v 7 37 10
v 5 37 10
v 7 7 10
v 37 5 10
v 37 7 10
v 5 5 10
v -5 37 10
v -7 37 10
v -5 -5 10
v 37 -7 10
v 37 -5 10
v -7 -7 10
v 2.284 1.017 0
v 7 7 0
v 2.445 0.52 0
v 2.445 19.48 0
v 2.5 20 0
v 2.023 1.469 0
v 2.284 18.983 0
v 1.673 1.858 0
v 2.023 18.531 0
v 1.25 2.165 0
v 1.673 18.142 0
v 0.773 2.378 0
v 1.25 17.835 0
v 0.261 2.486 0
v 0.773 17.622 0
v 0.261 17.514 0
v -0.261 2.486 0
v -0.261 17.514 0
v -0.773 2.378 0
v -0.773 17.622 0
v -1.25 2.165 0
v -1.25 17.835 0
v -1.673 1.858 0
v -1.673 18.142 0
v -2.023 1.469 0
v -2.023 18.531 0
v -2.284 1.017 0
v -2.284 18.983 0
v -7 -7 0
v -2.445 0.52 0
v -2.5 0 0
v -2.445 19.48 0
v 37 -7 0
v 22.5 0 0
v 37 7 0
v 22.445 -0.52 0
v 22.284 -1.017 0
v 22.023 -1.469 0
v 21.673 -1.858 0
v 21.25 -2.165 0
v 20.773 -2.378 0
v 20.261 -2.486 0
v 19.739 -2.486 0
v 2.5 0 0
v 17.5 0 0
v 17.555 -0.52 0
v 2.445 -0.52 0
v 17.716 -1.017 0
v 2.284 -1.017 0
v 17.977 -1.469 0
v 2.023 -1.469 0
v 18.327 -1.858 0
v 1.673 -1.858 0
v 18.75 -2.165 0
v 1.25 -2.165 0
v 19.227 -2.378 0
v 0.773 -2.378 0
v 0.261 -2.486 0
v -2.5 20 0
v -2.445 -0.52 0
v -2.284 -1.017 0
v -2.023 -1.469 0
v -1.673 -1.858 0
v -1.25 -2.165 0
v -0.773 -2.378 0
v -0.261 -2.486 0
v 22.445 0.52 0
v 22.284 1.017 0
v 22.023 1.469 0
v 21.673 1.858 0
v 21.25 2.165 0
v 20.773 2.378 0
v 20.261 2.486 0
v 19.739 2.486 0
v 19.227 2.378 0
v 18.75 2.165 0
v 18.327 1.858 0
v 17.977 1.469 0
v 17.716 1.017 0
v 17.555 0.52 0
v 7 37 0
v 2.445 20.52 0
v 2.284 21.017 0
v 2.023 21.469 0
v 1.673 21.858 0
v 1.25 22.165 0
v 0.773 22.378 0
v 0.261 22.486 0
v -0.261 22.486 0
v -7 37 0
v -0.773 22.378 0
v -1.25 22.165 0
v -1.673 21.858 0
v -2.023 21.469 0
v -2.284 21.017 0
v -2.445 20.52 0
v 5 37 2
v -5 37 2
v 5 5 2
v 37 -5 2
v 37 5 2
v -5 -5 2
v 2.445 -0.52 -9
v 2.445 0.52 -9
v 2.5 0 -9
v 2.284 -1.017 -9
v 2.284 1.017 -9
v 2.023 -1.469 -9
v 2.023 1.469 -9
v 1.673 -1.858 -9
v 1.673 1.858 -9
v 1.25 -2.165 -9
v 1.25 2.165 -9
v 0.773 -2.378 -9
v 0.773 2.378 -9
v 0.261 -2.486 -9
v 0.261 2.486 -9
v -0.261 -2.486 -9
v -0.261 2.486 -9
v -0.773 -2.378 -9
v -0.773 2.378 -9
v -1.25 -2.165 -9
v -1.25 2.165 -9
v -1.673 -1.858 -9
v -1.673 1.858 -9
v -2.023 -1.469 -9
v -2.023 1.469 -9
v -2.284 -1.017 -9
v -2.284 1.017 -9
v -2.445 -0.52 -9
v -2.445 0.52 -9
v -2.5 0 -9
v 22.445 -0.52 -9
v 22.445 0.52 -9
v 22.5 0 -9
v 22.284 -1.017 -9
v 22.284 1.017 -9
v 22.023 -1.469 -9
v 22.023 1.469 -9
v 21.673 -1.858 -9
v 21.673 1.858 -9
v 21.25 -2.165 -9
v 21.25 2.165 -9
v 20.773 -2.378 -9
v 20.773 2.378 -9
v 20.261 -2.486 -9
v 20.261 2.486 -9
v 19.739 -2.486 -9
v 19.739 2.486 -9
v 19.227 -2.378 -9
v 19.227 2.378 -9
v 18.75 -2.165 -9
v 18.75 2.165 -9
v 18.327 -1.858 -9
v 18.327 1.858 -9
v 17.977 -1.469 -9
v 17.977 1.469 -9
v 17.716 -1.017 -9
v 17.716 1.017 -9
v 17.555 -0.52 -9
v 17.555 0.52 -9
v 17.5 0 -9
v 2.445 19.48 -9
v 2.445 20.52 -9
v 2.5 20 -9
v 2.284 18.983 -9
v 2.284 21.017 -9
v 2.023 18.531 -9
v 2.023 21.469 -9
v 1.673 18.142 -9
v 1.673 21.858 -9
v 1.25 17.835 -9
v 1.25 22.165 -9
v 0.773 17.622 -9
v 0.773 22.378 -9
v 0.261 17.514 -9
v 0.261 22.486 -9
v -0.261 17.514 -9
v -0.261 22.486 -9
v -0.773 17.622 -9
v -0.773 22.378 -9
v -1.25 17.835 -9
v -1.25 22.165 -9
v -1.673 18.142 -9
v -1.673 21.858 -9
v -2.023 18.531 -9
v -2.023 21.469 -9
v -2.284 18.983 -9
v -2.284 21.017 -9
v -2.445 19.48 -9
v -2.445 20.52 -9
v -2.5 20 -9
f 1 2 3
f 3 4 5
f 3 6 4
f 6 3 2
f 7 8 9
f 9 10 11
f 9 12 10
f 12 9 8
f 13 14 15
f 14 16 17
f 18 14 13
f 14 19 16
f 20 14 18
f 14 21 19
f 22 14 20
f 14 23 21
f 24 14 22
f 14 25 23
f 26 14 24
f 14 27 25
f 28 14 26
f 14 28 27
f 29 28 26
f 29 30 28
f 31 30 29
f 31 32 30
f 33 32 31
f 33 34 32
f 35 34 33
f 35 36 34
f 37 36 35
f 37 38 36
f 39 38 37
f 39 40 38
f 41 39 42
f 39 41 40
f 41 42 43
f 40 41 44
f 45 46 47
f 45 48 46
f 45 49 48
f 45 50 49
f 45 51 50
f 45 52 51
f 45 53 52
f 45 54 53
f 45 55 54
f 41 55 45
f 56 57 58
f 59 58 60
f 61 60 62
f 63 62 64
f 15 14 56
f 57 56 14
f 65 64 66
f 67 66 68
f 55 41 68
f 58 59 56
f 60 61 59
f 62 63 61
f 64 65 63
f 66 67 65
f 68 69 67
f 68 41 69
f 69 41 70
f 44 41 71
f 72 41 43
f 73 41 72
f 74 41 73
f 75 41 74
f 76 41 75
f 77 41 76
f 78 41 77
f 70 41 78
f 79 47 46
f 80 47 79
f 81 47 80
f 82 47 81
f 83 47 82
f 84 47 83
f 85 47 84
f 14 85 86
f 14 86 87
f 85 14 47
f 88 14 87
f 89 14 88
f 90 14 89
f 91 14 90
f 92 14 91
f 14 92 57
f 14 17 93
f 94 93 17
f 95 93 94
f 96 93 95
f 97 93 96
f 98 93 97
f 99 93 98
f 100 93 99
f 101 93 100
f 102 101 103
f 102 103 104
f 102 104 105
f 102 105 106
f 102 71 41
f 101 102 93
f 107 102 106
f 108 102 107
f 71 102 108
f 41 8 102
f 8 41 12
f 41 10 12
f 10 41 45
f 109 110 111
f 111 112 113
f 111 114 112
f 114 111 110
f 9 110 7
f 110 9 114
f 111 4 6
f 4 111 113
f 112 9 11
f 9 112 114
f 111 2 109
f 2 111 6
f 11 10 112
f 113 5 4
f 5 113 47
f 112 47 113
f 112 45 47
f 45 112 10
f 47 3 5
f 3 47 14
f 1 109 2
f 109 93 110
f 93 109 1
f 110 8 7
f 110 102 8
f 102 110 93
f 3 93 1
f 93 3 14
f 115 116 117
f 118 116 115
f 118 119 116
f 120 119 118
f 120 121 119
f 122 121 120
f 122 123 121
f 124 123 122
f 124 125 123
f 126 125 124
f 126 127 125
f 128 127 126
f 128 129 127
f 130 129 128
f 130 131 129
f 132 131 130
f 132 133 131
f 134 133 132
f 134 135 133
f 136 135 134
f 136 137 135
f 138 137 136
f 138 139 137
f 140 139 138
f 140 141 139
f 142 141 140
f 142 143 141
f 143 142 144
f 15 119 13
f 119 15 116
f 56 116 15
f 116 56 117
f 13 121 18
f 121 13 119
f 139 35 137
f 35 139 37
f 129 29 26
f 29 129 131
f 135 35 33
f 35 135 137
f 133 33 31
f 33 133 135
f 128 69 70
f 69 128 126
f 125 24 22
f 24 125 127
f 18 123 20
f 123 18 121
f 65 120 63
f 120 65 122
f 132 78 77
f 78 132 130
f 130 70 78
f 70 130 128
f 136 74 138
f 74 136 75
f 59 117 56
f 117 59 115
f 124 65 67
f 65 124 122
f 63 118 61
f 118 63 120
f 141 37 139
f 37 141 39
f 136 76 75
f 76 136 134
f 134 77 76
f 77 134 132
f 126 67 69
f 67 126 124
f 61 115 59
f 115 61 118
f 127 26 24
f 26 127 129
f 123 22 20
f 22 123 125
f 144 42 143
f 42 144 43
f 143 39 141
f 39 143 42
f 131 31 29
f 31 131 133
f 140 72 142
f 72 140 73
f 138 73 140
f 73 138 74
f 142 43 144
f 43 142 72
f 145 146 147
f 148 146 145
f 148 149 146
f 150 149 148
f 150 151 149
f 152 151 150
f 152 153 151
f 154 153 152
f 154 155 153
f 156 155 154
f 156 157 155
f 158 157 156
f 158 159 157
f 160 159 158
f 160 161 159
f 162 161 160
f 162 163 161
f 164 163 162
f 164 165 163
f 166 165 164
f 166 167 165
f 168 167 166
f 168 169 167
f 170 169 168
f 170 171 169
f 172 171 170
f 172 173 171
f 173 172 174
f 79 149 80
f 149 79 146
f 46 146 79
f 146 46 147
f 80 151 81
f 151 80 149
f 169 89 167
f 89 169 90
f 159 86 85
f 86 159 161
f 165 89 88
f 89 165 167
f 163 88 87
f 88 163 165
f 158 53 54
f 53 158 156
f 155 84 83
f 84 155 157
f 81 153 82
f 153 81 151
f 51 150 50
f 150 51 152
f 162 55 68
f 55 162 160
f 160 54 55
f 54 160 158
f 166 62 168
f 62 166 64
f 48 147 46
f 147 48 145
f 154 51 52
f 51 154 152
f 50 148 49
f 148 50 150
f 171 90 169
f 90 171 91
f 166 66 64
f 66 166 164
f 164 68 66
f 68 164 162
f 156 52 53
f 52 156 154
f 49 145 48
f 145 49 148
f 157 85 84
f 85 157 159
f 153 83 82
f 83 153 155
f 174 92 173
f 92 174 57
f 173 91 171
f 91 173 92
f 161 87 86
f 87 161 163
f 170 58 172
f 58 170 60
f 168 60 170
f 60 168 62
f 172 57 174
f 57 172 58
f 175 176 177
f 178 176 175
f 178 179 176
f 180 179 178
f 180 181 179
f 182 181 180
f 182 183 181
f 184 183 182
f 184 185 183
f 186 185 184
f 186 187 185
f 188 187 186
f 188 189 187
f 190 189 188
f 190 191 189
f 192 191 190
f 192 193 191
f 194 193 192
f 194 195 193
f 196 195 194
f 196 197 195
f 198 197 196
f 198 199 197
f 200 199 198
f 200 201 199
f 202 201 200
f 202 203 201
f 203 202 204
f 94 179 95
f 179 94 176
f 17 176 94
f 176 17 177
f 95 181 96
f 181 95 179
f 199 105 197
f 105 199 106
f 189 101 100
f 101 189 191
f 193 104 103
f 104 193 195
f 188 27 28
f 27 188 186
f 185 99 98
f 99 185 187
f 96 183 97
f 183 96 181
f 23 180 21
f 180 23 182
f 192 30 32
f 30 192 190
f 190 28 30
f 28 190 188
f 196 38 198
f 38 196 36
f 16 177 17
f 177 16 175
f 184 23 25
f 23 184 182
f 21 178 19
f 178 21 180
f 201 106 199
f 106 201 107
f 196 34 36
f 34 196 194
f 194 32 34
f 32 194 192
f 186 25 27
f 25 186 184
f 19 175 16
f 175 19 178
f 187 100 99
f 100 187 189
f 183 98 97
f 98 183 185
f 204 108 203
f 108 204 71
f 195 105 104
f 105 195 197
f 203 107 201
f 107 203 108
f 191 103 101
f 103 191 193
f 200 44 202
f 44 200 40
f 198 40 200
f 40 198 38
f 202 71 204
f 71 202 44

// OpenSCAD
// Угловой паз с шипами для вставки в основание
// Модульная конструкция: центральное основание + 2 рукава (угол) + шипы

// Параметры (все размеры в мм)
center_size = 10;     // Размер центрального квадрата (внутри)
sleeve_length = 30;   // Длина рукава
groove_width = 10;    // Ширина паза (внутри) - для фанеры 9.3мм
wall_height = 10;     // Высота стенок
wall_thickness = 2;   // Толщина стенок

// Параметры шипов
dowel_diameter = 5;   // Диаметр шипа
dowel_depth = 9;      // Глубина шипа (высота)
dowel_spacing = 20;   // Шаг между шипами

// Вычисляемые размеры
total_width = groove_width + 2 * wall_thickness;  // 14 мм
center_total = center_size + 2 * wall_thickness;  // 14 мм

// 1. Метод: нарисовать основание
module draw_base() {
    difference() {
        cube([center_total, center_total, wall_height]);
        translate([wall_thickness, wall_thickness, wall_thickness])
            cube([center_size, center_size, wall_height]);
    }
}

// Модуль для создания одного рукава
module single_sleeve() {
    difference() {
        cube([sleeve_length, total_width, wall_height]);
        translate([0, wall_thickness, wall_thickness])
            cube([sleeve_length, groove_width, wall_height]);
    }
}

// Метод: вырезать отверстие в стенке основания
module cut_wall_opening(side) {
    if (side == 0) {
        translate([center_total - wall_thickness - 0.1, wall_thickness, wall_thickness])
            cube([wall_thickness + 0.2, groove_width, wall_height]);
    } else if (side == 1) {
        translate([wall_thickness, center_total - wall_thickness - 0.1, wall_thickness])
            cube([groove_width, wall_thickness + 0.2, wall_height]);
    }
}

// 2. Метод: прицепить рукав к основанию
module attach_sleeve(side) {
    if (side == 0) {
        translate([center_total, center_total/2 - total_width/2, 0])
            single_sleeve();
    } else if (side == 1) {
        translate([center_total/2 + total_width/2, center_total, 0])
            rotate([0, 0, 90])
                single_sleeve();
    }
}

// 3. Метод: добавить шип в позиции (x, y)
module add_dowel(x, y) {
    translate([x, y, -dowel_depth])
        cylinder(h=dowel_depth, d=dowel_diameter, $fn=30);
}

// Собираем L-образную конструкцию с шипами
translate([-center_total/2, -center_total/2, 0]) {
    union() {
        difference() {
            draw_base();
            cut_wall_opening(0);  // Право
            cut_wall_opening(1);  // Верх
        }
        attach_sleeve(0);  // Право
        attach_sleeve(1);  // Верх

        // Шипы: центр + 2 направления
        add_dowel(center_total/2, center_total/2);                    // Центр (угол)
        add_dowel(center_total/2 + dowel_spacing, center_total/2);   // Право
        add_dowel(center_total/2, center_total/2 + dowel_spacing);   // Верх
    }
}

// Информация для проверки
echo("=== Размеры углового паза с шипами ===");
echo("Количество шипов: 3 (угол + 2 направления)");
echo("Шаг между шипами:", dowel_spacing, "мм");
